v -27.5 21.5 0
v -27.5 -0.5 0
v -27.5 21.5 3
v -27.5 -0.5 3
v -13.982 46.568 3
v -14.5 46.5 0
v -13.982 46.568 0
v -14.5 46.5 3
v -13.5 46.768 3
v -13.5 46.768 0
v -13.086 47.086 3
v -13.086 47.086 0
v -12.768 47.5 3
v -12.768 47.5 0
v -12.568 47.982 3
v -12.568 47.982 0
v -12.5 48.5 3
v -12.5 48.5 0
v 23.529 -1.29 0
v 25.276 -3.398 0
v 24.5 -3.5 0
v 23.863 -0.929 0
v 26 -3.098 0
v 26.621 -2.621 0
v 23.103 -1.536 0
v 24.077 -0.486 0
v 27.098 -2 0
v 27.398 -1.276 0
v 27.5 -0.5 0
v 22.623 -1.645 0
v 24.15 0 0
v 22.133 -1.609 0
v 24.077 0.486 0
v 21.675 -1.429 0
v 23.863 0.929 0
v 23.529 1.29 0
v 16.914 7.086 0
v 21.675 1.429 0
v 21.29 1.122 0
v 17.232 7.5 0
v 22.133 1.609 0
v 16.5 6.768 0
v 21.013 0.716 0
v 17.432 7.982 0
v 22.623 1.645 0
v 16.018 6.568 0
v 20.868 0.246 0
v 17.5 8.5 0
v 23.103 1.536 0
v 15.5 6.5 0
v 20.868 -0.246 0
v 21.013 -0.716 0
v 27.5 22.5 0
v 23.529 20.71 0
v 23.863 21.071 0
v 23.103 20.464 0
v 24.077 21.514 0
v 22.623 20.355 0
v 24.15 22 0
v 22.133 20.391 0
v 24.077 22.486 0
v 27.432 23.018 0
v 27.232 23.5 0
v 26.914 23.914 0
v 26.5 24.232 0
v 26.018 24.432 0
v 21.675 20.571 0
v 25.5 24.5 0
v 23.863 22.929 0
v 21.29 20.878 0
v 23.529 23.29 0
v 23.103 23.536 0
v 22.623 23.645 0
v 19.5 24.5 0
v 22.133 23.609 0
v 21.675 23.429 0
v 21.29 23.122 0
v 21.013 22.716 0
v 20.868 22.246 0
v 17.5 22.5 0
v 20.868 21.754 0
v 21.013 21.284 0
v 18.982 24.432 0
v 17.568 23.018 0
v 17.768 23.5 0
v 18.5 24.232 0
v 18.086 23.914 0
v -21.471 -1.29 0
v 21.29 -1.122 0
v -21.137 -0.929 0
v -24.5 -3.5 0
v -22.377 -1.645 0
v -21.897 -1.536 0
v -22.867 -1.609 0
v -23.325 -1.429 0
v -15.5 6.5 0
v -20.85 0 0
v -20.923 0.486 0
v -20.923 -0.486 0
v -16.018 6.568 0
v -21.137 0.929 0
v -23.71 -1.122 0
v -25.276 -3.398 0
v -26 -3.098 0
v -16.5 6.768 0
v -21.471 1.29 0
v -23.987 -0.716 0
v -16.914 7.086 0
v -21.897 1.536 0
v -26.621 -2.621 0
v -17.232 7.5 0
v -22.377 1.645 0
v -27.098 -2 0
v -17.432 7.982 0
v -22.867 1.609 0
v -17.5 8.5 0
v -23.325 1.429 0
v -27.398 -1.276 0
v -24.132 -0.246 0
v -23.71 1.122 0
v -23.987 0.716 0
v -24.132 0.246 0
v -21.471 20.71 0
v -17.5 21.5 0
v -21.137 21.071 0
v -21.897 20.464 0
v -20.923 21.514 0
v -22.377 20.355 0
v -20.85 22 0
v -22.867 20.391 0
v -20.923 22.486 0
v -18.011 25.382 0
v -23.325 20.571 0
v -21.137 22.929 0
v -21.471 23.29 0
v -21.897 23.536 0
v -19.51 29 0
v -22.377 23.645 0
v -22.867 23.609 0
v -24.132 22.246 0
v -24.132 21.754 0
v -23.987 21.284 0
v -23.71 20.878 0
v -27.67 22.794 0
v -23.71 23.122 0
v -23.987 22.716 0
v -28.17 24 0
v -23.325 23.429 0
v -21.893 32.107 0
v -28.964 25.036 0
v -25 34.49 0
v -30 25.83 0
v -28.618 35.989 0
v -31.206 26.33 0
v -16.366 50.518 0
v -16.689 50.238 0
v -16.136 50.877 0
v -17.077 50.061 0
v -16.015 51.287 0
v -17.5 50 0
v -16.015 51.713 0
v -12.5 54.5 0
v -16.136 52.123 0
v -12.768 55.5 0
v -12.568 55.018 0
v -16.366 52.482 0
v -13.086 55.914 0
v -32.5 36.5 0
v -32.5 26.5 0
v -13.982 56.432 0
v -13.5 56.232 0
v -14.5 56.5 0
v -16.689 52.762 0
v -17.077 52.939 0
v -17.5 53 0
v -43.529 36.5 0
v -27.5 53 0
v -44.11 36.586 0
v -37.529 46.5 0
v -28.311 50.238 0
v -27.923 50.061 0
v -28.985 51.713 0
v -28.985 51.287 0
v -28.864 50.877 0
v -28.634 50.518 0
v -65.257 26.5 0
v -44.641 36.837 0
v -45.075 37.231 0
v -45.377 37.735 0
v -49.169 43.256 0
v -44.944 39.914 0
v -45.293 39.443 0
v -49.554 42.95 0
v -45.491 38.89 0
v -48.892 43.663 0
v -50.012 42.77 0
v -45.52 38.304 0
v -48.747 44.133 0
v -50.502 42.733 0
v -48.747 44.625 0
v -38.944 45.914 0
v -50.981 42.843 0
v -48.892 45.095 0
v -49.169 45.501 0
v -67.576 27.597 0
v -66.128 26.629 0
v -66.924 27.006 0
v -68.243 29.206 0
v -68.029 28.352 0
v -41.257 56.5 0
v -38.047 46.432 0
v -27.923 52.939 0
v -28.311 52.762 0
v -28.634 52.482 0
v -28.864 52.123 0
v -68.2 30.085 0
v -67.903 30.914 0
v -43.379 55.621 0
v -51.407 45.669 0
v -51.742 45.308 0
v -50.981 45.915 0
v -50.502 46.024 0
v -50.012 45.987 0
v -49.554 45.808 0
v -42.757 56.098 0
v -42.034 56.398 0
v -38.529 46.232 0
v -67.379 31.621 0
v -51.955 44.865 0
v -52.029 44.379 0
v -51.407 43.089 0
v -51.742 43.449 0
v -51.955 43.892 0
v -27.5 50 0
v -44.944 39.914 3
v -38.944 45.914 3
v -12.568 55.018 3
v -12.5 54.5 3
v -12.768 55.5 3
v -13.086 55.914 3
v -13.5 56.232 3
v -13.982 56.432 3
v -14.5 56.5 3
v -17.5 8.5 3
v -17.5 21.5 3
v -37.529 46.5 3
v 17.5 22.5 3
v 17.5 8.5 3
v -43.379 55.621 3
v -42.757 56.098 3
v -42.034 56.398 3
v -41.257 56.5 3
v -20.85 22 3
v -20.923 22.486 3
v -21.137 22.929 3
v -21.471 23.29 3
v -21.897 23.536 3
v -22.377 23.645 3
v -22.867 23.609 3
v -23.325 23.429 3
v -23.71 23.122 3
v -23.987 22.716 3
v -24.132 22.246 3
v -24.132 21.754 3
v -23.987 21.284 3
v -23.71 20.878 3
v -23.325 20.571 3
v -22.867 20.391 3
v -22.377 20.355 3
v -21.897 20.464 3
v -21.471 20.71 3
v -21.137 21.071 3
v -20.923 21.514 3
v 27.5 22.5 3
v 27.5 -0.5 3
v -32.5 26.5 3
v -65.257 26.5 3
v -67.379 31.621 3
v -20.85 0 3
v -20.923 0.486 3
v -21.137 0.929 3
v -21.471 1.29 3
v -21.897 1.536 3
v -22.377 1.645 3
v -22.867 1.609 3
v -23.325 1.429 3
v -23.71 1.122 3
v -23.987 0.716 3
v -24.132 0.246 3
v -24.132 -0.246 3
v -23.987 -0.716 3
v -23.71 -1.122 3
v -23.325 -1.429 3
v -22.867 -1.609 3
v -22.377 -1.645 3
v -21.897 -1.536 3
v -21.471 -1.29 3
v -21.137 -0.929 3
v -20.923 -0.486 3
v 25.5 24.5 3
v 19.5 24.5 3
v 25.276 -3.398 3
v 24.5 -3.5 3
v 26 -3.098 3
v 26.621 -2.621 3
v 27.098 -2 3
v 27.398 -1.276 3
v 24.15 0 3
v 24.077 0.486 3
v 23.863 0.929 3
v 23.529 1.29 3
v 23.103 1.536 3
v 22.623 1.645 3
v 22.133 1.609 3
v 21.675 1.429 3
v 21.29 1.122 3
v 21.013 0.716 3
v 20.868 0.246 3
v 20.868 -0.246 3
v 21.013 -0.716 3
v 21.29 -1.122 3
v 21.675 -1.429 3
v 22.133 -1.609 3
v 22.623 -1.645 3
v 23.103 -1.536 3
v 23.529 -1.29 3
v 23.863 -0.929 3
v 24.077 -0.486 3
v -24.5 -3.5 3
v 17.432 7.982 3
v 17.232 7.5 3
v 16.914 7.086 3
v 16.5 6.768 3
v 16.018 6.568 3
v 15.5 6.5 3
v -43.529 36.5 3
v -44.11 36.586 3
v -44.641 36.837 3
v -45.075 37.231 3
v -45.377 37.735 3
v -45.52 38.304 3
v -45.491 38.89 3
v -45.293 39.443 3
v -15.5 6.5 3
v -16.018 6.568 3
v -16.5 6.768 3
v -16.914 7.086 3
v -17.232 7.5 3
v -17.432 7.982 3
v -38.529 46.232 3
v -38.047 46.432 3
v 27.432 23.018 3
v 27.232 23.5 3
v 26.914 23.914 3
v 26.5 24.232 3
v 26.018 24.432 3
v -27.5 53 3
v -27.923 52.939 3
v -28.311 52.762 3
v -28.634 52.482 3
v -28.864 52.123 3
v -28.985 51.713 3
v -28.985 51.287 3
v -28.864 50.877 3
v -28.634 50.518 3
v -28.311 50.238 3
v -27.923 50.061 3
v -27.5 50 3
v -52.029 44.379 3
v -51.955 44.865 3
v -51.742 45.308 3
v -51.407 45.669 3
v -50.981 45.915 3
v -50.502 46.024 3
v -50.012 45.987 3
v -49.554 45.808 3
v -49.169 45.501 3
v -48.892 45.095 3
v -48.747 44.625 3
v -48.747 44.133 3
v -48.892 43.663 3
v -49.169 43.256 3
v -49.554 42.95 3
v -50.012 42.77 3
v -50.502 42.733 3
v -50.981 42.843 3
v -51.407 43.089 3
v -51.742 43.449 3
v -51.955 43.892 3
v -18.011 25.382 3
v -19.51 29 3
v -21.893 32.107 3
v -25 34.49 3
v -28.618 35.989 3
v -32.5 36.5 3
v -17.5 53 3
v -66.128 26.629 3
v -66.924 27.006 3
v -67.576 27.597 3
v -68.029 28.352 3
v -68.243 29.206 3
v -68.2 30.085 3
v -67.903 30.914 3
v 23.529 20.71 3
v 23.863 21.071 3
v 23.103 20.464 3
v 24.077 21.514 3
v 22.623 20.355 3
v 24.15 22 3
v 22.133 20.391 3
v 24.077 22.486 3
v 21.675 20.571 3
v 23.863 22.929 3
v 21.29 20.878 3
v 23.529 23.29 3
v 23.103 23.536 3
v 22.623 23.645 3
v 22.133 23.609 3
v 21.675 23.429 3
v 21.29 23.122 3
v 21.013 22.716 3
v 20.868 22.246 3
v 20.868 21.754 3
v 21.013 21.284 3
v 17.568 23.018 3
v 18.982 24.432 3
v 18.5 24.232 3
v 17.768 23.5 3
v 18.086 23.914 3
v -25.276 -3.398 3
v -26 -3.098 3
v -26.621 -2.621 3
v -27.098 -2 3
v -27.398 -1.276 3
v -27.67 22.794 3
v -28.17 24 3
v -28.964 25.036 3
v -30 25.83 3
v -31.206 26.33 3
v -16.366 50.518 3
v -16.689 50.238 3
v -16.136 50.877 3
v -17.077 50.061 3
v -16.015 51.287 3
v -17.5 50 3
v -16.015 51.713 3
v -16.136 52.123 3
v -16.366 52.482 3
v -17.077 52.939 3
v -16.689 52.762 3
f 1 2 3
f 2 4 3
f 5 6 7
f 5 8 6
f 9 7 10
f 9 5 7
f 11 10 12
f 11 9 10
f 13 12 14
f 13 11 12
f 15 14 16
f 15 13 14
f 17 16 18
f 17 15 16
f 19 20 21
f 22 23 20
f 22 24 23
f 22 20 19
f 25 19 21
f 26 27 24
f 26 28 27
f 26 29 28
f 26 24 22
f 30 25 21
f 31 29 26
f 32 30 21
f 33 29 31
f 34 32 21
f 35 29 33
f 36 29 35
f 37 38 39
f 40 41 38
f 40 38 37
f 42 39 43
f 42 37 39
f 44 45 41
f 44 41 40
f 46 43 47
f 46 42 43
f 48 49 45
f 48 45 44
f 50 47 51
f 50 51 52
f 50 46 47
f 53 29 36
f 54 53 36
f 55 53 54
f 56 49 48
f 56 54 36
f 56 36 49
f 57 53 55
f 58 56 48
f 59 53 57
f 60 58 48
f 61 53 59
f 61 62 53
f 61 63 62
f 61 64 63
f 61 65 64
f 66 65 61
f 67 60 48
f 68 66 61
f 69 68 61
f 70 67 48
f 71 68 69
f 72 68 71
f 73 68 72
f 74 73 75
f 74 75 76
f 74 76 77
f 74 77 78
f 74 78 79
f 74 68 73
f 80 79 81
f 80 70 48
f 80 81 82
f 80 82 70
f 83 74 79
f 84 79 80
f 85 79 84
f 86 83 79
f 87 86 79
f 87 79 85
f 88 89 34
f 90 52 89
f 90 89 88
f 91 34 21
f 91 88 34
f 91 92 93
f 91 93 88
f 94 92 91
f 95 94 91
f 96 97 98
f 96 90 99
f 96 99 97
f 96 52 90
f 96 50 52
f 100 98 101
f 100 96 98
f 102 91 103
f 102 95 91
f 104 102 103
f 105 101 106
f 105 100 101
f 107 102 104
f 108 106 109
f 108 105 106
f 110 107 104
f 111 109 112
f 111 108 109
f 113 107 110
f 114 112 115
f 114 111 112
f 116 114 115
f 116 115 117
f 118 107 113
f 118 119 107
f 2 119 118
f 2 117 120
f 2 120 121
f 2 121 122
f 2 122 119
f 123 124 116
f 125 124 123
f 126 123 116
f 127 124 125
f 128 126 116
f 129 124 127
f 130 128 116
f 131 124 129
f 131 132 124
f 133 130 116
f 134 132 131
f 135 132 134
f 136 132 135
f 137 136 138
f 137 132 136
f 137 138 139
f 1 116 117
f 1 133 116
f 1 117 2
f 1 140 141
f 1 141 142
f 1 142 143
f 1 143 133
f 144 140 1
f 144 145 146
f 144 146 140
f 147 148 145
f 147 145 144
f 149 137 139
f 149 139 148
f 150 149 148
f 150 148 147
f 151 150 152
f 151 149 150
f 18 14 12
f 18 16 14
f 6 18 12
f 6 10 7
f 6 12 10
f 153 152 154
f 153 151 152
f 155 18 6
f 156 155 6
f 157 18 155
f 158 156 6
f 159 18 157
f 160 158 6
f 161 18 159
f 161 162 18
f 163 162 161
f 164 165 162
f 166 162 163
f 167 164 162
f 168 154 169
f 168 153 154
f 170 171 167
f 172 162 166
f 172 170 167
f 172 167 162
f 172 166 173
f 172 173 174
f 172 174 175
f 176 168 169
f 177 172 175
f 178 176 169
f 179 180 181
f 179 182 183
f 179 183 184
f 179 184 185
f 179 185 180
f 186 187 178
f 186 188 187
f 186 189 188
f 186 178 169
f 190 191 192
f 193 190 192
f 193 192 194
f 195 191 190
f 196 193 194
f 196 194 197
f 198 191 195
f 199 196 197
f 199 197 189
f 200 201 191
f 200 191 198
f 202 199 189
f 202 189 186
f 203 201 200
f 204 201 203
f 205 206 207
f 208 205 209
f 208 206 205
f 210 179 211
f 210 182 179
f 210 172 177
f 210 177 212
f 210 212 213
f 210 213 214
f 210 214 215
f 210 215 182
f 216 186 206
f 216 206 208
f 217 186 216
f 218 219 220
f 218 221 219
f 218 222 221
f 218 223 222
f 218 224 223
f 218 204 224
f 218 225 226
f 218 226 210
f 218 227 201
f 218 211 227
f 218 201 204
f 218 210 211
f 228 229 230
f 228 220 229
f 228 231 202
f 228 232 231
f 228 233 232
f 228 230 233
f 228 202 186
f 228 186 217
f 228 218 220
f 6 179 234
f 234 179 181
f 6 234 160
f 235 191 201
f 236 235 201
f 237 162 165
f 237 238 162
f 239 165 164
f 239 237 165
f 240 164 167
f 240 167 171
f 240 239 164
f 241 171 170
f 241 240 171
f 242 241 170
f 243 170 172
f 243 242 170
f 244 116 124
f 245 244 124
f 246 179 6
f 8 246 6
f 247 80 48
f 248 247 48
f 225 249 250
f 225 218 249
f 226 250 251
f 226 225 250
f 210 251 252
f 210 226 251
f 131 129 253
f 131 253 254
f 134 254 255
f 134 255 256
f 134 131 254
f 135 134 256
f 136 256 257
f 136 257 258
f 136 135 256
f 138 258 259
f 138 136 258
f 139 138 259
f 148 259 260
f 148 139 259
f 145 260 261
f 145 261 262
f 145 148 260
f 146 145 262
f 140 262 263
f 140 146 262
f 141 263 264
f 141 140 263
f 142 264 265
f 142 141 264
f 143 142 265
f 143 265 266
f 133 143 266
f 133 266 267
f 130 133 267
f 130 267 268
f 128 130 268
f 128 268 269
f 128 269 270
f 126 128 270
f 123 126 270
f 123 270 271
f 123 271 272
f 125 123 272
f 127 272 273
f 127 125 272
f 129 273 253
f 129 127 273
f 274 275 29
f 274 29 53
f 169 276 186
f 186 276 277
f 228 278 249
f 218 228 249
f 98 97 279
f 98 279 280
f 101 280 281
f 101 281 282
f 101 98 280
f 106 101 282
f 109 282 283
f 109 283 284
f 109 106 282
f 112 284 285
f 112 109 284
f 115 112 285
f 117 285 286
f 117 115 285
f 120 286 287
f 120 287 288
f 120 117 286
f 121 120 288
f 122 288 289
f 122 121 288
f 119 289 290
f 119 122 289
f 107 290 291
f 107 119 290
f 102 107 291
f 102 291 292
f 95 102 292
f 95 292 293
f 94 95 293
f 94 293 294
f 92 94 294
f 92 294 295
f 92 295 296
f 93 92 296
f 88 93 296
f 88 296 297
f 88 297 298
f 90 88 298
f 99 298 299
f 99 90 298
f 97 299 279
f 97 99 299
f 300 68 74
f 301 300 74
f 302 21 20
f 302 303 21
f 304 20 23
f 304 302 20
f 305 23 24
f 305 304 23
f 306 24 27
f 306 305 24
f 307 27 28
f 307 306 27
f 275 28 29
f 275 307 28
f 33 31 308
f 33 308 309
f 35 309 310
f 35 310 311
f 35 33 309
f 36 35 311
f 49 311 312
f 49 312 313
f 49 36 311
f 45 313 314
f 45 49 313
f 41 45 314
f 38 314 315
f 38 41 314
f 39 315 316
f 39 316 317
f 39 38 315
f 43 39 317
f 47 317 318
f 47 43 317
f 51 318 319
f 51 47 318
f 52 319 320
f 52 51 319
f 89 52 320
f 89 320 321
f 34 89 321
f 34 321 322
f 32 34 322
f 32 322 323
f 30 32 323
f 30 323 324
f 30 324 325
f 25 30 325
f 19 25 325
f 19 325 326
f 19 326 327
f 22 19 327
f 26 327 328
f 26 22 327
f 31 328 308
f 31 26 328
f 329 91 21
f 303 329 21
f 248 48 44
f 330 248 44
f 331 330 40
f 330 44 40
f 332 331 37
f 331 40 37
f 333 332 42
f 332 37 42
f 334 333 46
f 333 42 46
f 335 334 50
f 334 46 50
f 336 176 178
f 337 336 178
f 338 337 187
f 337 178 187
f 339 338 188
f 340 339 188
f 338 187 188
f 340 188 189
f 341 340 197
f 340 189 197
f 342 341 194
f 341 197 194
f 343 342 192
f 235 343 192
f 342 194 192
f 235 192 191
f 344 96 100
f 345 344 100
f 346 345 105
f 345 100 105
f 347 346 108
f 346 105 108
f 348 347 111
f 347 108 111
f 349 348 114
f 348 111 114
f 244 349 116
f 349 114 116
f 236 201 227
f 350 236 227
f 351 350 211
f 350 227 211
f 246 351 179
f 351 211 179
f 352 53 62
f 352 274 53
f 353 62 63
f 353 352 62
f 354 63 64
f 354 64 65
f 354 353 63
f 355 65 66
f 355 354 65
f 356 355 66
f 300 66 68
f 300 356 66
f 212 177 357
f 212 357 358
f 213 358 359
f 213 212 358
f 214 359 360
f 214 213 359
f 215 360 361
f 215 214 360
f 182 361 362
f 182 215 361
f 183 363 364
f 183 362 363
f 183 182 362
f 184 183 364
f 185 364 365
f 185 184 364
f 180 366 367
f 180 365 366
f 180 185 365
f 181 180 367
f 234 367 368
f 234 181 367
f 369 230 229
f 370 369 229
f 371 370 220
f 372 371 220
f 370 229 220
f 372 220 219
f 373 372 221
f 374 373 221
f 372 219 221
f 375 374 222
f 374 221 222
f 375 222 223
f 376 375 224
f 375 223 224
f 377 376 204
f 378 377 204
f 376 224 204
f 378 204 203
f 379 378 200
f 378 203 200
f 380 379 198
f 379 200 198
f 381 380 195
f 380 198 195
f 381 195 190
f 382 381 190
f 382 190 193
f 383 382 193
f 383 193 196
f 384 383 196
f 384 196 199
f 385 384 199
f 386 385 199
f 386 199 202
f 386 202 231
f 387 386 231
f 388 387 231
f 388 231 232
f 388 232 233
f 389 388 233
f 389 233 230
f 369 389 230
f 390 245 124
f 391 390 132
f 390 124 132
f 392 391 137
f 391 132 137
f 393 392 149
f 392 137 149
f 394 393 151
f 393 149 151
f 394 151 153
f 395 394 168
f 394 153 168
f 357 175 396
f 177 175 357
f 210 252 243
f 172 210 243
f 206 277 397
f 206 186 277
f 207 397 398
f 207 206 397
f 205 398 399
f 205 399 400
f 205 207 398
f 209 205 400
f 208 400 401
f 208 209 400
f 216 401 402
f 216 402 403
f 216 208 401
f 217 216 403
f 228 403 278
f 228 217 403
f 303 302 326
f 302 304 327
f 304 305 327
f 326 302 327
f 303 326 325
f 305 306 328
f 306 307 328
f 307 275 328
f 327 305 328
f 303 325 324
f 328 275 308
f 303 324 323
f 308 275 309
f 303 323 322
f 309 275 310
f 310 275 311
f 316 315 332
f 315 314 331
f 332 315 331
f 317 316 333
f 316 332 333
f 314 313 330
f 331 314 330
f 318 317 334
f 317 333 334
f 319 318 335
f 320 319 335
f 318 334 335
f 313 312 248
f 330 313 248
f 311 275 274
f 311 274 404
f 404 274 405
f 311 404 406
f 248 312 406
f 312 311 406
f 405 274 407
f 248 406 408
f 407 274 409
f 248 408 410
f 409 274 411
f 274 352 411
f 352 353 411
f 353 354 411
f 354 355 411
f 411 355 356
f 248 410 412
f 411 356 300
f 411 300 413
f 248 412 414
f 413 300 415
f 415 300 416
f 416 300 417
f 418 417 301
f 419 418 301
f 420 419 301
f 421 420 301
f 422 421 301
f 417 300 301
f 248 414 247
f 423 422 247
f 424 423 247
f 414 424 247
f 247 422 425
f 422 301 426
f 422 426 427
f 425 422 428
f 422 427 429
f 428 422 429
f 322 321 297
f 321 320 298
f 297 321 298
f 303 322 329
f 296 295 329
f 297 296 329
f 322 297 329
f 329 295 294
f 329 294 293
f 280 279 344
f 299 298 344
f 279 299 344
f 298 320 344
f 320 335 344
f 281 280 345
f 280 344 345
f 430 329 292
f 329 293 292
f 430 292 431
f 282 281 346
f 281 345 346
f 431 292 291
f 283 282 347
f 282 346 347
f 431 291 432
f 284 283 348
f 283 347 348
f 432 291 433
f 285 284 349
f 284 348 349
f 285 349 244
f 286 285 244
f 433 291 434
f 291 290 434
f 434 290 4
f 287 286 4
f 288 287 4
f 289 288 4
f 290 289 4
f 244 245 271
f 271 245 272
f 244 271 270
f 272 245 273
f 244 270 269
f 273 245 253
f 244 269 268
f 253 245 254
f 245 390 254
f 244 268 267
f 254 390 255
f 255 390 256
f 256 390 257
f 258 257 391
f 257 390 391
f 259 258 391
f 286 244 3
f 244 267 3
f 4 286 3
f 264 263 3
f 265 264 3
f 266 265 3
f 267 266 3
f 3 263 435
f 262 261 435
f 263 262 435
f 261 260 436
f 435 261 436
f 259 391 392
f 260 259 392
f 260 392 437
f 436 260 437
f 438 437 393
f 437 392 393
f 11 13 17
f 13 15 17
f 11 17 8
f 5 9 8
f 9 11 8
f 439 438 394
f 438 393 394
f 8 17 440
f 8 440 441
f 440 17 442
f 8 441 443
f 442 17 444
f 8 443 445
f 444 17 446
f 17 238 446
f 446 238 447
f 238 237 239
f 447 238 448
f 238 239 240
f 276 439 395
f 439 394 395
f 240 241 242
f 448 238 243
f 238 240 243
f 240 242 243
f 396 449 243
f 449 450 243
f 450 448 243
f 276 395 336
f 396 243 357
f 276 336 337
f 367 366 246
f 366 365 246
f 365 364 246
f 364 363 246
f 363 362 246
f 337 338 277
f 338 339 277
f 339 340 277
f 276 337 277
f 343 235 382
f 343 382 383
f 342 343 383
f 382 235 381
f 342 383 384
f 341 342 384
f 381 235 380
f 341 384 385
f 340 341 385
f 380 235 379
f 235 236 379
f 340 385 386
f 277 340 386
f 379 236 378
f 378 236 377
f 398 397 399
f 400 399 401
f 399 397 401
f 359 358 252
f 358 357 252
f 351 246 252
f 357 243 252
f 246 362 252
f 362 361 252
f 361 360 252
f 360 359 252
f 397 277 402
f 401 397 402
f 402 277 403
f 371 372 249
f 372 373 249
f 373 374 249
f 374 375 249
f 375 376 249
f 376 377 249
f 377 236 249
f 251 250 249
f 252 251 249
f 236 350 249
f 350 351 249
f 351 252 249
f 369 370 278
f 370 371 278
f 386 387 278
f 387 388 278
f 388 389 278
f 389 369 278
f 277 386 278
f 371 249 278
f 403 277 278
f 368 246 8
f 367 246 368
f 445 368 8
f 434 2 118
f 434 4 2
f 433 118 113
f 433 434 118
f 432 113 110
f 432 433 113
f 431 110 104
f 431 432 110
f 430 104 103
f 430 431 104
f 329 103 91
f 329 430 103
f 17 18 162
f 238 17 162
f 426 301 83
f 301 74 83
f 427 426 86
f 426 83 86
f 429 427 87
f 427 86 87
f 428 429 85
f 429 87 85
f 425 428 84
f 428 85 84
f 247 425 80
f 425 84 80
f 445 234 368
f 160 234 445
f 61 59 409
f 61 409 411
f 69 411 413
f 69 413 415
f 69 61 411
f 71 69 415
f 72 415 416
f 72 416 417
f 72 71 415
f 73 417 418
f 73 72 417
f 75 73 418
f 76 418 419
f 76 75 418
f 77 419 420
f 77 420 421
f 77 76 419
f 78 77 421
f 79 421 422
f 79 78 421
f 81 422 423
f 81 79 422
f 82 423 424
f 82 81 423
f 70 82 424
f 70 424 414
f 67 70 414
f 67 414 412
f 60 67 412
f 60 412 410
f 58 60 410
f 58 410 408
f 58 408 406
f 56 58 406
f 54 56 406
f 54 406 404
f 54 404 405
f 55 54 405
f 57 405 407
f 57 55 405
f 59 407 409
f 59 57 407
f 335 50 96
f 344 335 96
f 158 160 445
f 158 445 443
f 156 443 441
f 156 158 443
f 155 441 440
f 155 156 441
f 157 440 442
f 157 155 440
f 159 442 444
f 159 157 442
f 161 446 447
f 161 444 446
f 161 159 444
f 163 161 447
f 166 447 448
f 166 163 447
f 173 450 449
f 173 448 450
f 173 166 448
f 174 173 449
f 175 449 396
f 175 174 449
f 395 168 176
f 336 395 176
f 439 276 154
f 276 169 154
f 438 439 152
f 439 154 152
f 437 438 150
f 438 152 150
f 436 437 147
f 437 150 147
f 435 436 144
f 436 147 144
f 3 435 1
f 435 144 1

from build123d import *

# Parameters (mm, degrees)
SKETCH_1_W          = 55
SKETCH_1_H          = 30
SKETCH_1_R          = 1.65
EXTRUDE_1_DEPTH     = 3
SKETCH_2_W          = 55
SKETCH_2_H          = 30
EXTRUDE_2_DEPTH     = 3
EXTRUDE_3_DEPTH     = 3
SKETCH_8_R          = 1.65
CUT_EXTRUDE_1_DEPTH = 10
FILLET_1_R          = 5
FILLET_2_R          = 3
CUT_EXTRUDE_2_DEPTH = 10
CUT_EXTRUDE_3_DEPTH = 4
CUT_EXTRUDE_4_DEPTH = 4
FILLET_3_R          = 2


with BuildPart() as part:
    # 草图1 → 凸台-拉伸1 (new body)
    with BuildSketch(Plane.XY):
        with Locations((0, 11.5)):
            Rectangle(SKETCH_1_W, SKETCH_1_H)
        with Locations((-22.5, 0)):
            Circle(SKETCH_1_R, mode=Mode.SUBTRACT)
        with Locations((-22.5, 22)):
            Circle(SKETCH_1_R, mode=Mode.SUBTRACT)
        with Locations((22.5, 22)):
            Circle(SKETCH_1_R, mode=Mode.SUBTRACT)
        with Locations((22.5, 0)):
            Circle(SKETCH_1_R, mode=Mode.SUBTRACT)
    extrude(amount=EXTRUDE_1_DEPTH)

    # 草图2 → 凸台-拉伸2 (add)
    with BuildSketch(Plane.XY.offset(3)):
        with Locations((0, 41.5)):
            Rectangle(SKETCH_2_W, SKETCH_2_H)
    extrude(amount=-EXTRUDE_2_DEPTH)

    # 草图4 → 凸台-拉伸3 (add)
    with BuildSketch(Plane.XY.offset(3)):
        Polygon((-27.5, 26.5), (-72.5, 26.5), (-42.5, 56.5), (-27.5, 56.5), align=None)
    extrude(amount=-EXTRUDE_3_DEPTH)

    # 草图8 → 切除-拉伸1 (cut)
    with BuildSketch(Plane(origin=(0, 0, 0), x_dir=(-1, 0, 0), z_dir=(0, 0, -1))):
        with Locations((50.378679656, 44.378679656)):
            Circle(SKETCH_8_R)
    extrude(amount=-CUT_EXTRUDE_1_DEPTH, mode=Mode.SUBTRACT)

    # 圆角1
    fillet_1_edges = [part.edges().sort_by_distance(p)[0] for p in [
        (-27.5, 26.5, 1.5),
    ]]
    fillet(fillet_1_edges, radius=FILLET_1_R)

    # 圆角2
    fillet_2_edges = [part.edges().sort_by_distance(p)[0] for p in [
        (27.5, 56.5, 1.5),
        (-42.5, 56.5, 1.5),
        (-72.5, 26.5, 1.5),
        (27.5, -3.5, 1.5),
        (-27.5, -3.5, 1.5),
    ]]
    fillet(fillet_2_edges, radius=FILLET_2_R)

    # 草图9 → 切除-拉伸2 (cut)
    with BuildSketch(Plane(origin=(0, 0, 0), x_dir=(-1, 0, 0), z_dir=(0, 0, -1))):
        with BuildLine():
            Line((17.5, 53), (27.5, 53))
            ThreePointArc((27.5, 53), (29, 51.5), (27.5, 50))
            Line((27.5, 50), (17.5, 50))
            ThreePointArc((17.5, 50), (16, 51.5), (17.5, 53))
        make_face()
    extrude(amount=-CUT_EXTRUDE_2_DEPTH, mode=Mode.SUBTRACT)

    # 草图10 → 切除-拉伸3 (cut, through all)
    with BuildSketch(Plane(origin=(0, 0, 0), x_dir=(-1, 0, 0), z_dir=(0, 0, -1))):
        with BuildLine():
            Line((-15.5, 6.5), (15.5, 6.5))
            ThreePointArc((15.5, 6.5), (16.914213562, 7.085786438), (17.5, 8.5))
            Line((17.5, 8.5), (17.5, 21.5))
            ThreePointArc((17.5, 21.5), (21.893398282, 32.106601718), (32.5, 36.5))
            Line((32.5, 36.5), (43.529437252, 36.5))
            ThreePointArc((43.529437252, 36.5), (45.377196317, 37.734633135), (44.943650814, 39.914213562))
            Line((44.943650814, 39.914213562), (38.943650814, 45.914213562))
            ThreePointArc((38.943650814, 45.914213562), (38.294804116, 46.347759065), (37.529437252, 46.5))
            Line((37.529437252, 46.5), (-15.5, 46.5))
            ThreePointArc((-15.5, 46.5), (-16.914213562, 45.914213562), (-17.5, 44.5))
            Line((-17.5, 44.5), (-17.5, 8.5))
            ThreePointArc((-17.5, 8.5), (-16.914213562, 7.085786438), (-15.5, 6.5))
        make_face()
    extrude(amount=-CUT_EXTRUDE_3_DEPTH, mode=Mode.SUBTRACT)

    # 草图11 → 切除-拉伸4 (cut, through all)
    with BuildSketch(Plane(origin=(0, 0, 0), x_dir=(-1, 0, 0), z_dir=(0, 0, -1))):
        with BuildLine():
            Line((-27.5, 24.5), (12.5, 24.5))
            Line((12.5, 24.5), (12.5, 56.5))
            Line((12.5, 56.5), (-24.5, 56.5))
            ThreePointArc((-24.5, 56.5), (-26.621320344, 55.621320344), (-27.5, 53.5))
            Line((-27.5, 53.5), (-27.5, 24.5))
        make_face()
    extrude(amount=-CUT_EXTRUDE_4_DEPTH, mode=Mode.SUBTRACT)

    # 圆角3
    fillet_3_edges = [part.edges().sort_by_distance(p)[0] for p in [
        (-12.5, 46.5, 1.5),
        (17.5, 24.5, 1.5),
        (-12.5, 56.5, 1.5),
        (27.5, 24.5, 1.5),
    ]]
    fillet(fillet_3_edges, radius=FILLET_3_R)


solid = part.part
